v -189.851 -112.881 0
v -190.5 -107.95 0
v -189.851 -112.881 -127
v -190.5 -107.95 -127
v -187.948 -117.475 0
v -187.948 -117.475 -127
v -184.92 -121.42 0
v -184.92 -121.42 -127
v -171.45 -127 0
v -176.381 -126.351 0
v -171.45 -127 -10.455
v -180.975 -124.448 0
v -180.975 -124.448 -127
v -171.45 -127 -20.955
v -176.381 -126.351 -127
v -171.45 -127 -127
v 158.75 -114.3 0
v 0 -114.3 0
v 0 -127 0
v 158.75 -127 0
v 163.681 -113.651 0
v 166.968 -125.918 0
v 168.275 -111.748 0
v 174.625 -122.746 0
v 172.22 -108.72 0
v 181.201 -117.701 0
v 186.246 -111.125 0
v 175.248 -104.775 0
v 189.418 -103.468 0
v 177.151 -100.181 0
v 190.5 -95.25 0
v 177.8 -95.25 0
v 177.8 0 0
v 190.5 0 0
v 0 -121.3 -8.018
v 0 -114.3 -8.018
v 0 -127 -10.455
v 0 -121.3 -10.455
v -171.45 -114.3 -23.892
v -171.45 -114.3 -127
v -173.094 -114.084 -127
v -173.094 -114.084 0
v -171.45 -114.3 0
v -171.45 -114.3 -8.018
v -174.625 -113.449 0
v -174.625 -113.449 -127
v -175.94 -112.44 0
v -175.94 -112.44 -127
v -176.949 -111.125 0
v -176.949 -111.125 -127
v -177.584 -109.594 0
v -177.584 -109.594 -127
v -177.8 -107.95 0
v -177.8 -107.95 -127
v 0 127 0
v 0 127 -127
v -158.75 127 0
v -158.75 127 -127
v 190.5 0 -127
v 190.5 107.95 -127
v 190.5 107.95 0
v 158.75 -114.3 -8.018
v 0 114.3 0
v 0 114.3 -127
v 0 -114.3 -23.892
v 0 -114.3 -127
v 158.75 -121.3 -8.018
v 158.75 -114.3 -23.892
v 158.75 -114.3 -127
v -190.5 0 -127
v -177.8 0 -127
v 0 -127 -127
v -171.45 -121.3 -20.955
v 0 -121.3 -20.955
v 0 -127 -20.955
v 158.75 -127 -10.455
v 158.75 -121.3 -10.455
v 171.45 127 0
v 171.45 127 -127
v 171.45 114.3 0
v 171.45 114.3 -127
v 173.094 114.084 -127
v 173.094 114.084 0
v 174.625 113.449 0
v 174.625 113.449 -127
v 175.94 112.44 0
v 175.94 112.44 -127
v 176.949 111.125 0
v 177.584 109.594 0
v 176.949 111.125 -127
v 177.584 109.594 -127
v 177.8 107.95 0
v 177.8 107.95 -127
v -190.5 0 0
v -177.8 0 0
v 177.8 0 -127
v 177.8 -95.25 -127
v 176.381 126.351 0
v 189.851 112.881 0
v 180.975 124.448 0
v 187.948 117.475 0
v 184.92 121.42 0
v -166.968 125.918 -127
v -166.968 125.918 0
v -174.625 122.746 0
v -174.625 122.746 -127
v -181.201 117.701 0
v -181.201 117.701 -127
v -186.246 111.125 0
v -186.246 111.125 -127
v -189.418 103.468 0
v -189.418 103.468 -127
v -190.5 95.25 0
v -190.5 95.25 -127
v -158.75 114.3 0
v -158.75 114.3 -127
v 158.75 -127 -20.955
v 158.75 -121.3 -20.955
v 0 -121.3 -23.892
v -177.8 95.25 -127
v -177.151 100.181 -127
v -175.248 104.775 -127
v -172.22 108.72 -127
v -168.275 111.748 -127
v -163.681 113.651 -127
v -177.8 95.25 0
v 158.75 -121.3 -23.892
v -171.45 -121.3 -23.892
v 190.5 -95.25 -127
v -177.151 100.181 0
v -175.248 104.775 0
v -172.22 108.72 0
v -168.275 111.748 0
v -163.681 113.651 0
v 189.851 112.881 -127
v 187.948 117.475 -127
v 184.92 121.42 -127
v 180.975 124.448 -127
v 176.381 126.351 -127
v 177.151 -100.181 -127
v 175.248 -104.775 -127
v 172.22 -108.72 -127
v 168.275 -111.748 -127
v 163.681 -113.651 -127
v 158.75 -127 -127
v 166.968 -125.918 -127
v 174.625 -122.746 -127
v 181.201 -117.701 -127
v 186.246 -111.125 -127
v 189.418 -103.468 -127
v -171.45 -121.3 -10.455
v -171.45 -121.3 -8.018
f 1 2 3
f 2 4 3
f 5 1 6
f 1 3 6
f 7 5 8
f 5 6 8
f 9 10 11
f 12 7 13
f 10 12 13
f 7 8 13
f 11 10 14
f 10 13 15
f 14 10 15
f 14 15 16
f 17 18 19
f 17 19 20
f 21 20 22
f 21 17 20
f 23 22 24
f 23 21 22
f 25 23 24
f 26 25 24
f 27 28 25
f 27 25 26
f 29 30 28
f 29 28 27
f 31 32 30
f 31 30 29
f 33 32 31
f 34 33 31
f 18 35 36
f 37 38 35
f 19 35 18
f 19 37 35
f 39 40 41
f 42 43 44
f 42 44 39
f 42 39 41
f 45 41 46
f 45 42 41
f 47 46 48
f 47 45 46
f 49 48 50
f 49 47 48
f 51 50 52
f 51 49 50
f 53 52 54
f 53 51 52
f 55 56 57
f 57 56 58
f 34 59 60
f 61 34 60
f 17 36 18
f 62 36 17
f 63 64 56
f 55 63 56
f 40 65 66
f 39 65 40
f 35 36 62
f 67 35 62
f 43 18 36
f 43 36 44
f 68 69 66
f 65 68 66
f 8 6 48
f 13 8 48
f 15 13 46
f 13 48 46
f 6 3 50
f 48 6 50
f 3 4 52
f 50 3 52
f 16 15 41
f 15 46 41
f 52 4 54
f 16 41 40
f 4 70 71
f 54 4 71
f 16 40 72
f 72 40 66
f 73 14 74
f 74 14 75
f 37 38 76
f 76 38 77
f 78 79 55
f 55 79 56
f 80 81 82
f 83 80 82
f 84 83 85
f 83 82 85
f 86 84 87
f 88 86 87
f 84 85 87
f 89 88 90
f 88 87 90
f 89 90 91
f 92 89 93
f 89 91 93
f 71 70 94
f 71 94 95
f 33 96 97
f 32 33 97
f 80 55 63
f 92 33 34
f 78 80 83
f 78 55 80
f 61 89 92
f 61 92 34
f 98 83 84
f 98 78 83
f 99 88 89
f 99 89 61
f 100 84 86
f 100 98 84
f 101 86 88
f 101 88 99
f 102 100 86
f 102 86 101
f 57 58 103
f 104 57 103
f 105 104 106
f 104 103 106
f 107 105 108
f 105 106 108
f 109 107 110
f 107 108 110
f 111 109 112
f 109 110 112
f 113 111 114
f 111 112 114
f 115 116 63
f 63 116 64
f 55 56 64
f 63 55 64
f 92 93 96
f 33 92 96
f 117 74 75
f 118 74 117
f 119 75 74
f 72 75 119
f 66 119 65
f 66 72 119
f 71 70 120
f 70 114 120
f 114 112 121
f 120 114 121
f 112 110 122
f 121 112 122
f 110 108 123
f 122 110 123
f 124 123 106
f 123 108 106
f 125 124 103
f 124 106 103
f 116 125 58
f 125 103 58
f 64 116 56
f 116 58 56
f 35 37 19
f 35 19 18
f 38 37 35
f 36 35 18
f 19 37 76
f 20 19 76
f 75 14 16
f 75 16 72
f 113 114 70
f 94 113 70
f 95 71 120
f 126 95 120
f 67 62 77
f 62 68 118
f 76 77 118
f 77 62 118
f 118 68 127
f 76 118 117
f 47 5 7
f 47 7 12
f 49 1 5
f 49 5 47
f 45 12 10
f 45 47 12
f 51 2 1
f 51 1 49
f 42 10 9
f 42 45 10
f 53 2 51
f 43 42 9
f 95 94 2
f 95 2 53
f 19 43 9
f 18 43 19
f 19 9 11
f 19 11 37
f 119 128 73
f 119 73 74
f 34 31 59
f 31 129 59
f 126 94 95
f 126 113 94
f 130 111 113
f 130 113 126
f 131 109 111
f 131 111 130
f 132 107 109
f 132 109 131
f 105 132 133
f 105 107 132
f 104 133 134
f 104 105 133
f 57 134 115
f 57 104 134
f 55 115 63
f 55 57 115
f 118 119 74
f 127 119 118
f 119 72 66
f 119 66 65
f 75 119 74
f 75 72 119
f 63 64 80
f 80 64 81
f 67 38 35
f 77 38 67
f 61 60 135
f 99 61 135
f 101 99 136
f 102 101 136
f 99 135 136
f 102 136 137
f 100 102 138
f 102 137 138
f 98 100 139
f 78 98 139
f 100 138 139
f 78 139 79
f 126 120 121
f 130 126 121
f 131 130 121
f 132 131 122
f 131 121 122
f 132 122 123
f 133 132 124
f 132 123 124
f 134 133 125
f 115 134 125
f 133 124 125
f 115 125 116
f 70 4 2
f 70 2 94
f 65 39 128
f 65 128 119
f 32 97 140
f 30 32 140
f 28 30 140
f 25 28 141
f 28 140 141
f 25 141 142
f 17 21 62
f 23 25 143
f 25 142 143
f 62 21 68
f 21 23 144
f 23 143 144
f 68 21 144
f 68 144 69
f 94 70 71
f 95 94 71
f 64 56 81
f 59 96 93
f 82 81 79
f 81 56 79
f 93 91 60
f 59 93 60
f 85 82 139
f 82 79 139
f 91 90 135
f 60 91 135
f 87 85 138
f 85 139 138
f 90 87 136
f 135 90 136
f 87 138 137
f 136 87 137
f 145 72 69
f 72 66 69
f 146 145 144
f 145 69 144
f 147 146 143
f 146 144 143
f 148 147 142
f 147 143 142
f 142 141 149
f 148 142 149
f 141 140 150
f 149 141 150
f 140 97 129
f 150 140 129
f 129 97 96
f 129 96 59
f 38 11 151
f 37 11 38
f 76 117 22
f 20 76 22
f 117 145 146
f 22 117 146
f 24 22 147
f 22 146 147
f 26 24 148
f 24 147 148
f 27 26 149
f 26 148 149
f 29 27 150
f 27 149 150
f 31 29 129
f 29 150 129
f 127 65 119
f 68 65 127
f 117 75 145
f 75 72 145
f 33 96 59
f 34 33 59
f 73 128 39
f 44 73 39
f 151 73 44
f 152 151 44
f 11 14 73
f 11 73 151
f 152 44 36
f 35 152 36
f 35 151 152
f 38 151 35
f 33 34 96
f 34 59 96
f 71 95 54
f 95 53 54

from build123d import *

# Parameters (mm, degrees)
SKETCH1_W           = 381
SKETCH1_H           = 254
BOSS_EXTRUDE1_DEPTH = 127
FILLET5_R           = 19.05
FILLET4_R           = 31.75
CUT_EXTRUDE1_DEPTH  = 262.817207227
CUT_EXTRUDE2_REACH  = 343.958
SKETCH5_W           = 330.2
SKETCH5_H           = 10.5
SKETCH13_W          = 330.2
SKETCH13_H          = 15.875
CUT_EXTRUDE6_DEPTH  = 7
SPLIT1_START        = -107.95
SPLIT1_OUTLINE_W    = 368.3
SPLIT1_OUTLINE_H    = 127
SPLIT1_DEPTH        = 234.95
SPLIT1_START_2      = -127
SPLIT1_2_DEPTH      = 19.05
SPLIT1_3_OUTLINE_W  = 12.7
SPLIT1_3_OUTLINE_H  = 127
SPLIT1_3_DEPTH      = 127
SPLIT1_4_DEPTH      = 103.1075
SPLIT1_START_3      = -23.8925
SPLIT1_5_DEPTH      = 23.8925
SPLIT1_START_4      = -8.0175
SPLIT1_6_OUTLINE_W  = 158.75
SPLIT1_6_OUTLINE_H  = 12.7
SPLIT1_6_DEPTH      = 8.0175
SPLIT1_7_OUTLINE_W  = 158.75
SPLIT1_7_OUTLINE_H  = 5.7
SPLIT1_7_DEPTH      = 2.9375
SPLIT1_START_5      = -10.455
SPLIT1_8_OUTLINE_W  = 158.75
SPLIT1_8_OUTLINE_H  = 5.7
SPLIT1_8_DEPTH      = 2.4375
SPLIT1_9_DEPTH      = 127
SPLIT1_10_DEPTH     = 127


# Read off the part's stored shape, not the designer's step: Split1
with BuildPart() as part:
    # Sketch1 → Boss-Extrude1 (new body)
    with BuildSketch(Plane.XY):
        Rectangle(SKETCH1_W, SKETCH1_H)
    extrude(amount=-BOSS_EXTRUDE1_DEPTH)

    # Fillet5
    fillet5_edges = [part.edges().sort_by_distance(p)[0] for p in [
        (-190.5, -127, -63.5),
        (190.5, 127, -63.5),
    ]]
    fillet(fillet5_edges, radius=FILLET5_R)

    # Fillet4
    fillet4_edges = [part.edges().sort_by_distance(p)[0] for p in [
        (190.5, -127, -63.5),
        (-190.5, 127, -63.5),
    ]]
    fillet(fillet4_edges, radius=FILLET4_R)

    # Sketch3 → Cut-Extrude1 (cut, through all)
    with BuildSketch(Plane(origin=(0, 0, 0), x_dir=(-1, 0, 0), z_dir=(0, 0, -1))):
        with BuildLine():
            Line((-158.75, -114.3), (171.45, -114.3))
            ThreePointArc((171.45, -114.3), (175.940128061, -112.440128061), (177.8, -107.95))
            Line((177.8, -107.95), (177.8, 95.25))
            ThreePointArc((177.8, 95.25), (172.220384182, 108.720384182), (158.75, 114.3))
            Line((158.75, 114.3), (-171.45, 114.3))
            ThreePointArc((-171.45, 114.3), (-175.940128061, 112.440128061), (-177.8, 107.95))
            Line((-177.8, 107.95), (-177.8, -95.25))
            ThreePointArc((-177.8, -95.25), (-172.220384182, -108.720384182), (-158.75, -114.3))
        make_face()
    extrude(amount=CUT_EXTRUDE1_DEPTH, mode=Mode.SUBTRACT)

    # Sketch5 → Cut-Extrude2 (cut, up to next)
    with BuildSketch(Plane.XZ.offset(127), mode=Mode.PRIVATE) as cut_extrude2_sk1:
        with Locations((-6.35, -15.705)):
            Rectangle(SKETCH5_W, SKETCH5_H)
    cut_extrude2_tool1 = extrude(cut_extrude2_sk1.sketch, amount=-CUT_EXTRUDE2_REACH, mode=Mode.PRIVATE) & part.part
    add(cut_extrude2_tool1.solids().sort_by_distance((-6.35, -127, -15.705))[0], mode=Mode.SUBTRACT)

    # Sketch13 → Cut-Extrude6 (cut)
    with BuildSketch(Plane(origin=(0, -114.3, 0), x_dir=(1, 0, 0), z_dir=(0, 1, 0))):
        with Locations((-6.35, 15.955)):
            Rectangle(SKETCH13_W, SKETCH13_H)
    extrude(amount=-CUT_EXTRUDE6_DEPTH, mode=Mode.SUBTRACT)

    # Split1 outline → Split1 (cut)
    with BuildSketch(Plane(origin=(0, 0, 0), x_dir=(1, 0, 0), z_dir=(0, 1, 0)).offset(SPLIT1_START)):
        with Locations((6.35, 63.5)):
            Rectangle(SPLIT1_OUTLINE_W, SPLIT1_OUTLINE_H)
    extrude(amount=SPLIT1_DEPTH, mode=Mode.SUBTRACT)

    # Split1 2 outline → Split1 2 (cut)
    with BuildSketch(Plane(origin=(0, 0, 0), x_dir=(1, 0, 0), z_dir=(0, 1, 0)).offset(SPLIT1_START_2)):
        Polygon((0, 0), (190.5, 0), (190.5, 127), (0, 127), (0, 20.955), (158.75, 20.955), (158.75, 10.455), (0, 10.455), align=None)
    extrude(amount=SPLIT1_2_DEPTH, mode=Mode.SUBTRACT)

    # Split1 3 outline → Split1 3 (cut)
    with BuildSketch(Plane(origin=(0, 0, 0), x_dir=(1, 0, 0), z_dir=(0, 1, 0))):
        with Locations((-184.15, 63.5)):
            Rectangle(SPLIT1_3_OUTLINE_W, SPLIT1_3_OUTLINE_H)
    extrude(amount=SPLIT1_3_DEPTH, mode=Mode.SUBTRACT)


with BuildPart() as body_2:
    # Split1 4 outline → Split1 4 (new body)
    with BuildSketch(Plane.XY.offset(SPLIT1_START_2)):
        with BuildLine():
            Line((0, -127), (158.75, -127))
            ThreePointArc((158.75, -127), (181.200640303, -117.700640303), (190.5, -95.25))
            Line((190.5, -95.25), (190.5, 0))
            Line((190.5, 0), (177.8, 0))
            Line((177.8, 0), (177.8, -95.25))
            ThreePointArc((177.8, -95.25), (172.220384182, -108.720384182), (158.75, -114.3))
            Line((158.75, -114.3), (0, -114.3))
            Line((0, -114.3), (0, -127))
        make_face()
    extrude(amount=SPLIT1_4_DEPTH)

    # Split1 5 outline → Split1 5 (add)
    with BuildSketch(Plane.XY.offset(SPLIT1_START_3)):
        with BuildLine():
            Line((158.75, -114.3), (158.75, -127))
            ThreePointArc((158.75, -127), (181.200640303, -117.700640303), (190.5, -95.25))
            Line((190.5, -95.25), (190.5, 0))
            Line((190.5, 0), (177.8, 0))
            Line((177.8, 0), (177.8, -95.25))
            ThreePointArc((177.8, -95.25), (172.220384182, -108.720384182), (158.75, -114.3))
        make_face()
    extrude(amount=SPLIT1_5_DEPTH)

    # Split1 6 outline → Split1 6 (add)
    with BuildSketch(Plane.XY.offset(SPLIT1_START_4)):
        with Locations((79.375, -120.65)):
            Rectangle(SPLIT1_6_OUTLINE_W, SPLIT1_6_OUTLINE_H)
    extrude(amount=SPLIT1_6_DEPTH)

    # Split1 7 outline → Split1 7 (add)
    with BuildSketch(Plane.XY.offset(SPLIT1_START_3)):
        with Locations((79.375, -124.15)):
            Rectangle(SPLIT1_7_OUTLINE_W, SPLIT1_7_OUTLINE_H)
    extrude(amount=SPLIT1_7_DEPTH)

    # Split1 8 outline → Split1 8 (add)
    with BuildSketch(Plane.XY.offset(SPLIT1_START_5)):
        with Locations((79.375, -124.15)):
            Rectangle(SPLIT1_8_OUTLINE_W, SPLIT1_8_OUTLINE_H)
    extrude(amount=SPLIT1_8_DEPTH)


with BuildPart() as body_3:
    # Split1 9 outline → Split1 9 (new body)
    with BuildSketch(Plane.XY.offset(SPLIT1_START_2)):
        with BuildLine():
            Line((0, 127), (0, 114.3))
            Line((0, 114.3), (171.45, 114.3))
            ThreePointArc((171.45, 114.3), (175.940128061, 112.440128061), (177.8, 107.95))
            Line((177.8, 107.95), (177.8, 0))
            Line((177.8, 0), (190.5, 0))
            Line((190.5, 0), (190.5, 107.95))
            ThreePointArc((190.5, 107.95), (184.920384182, 121.420384182), (171.45, 127))
            Line((171.45, 127), (0, 127))
        make_face()
    extrude(amount=SPLIT1_9_DEPTH)


with BuildPart() as body_4:
    # Split1 10 outline → Split1 10 (new body)
    with BuildSketch(Plane.XY.offset(SPLIT1_START_2)):
        with BuildLine():
            Line((-190.5, 0), (-177.8, 0))
            Line((-177.8, 0), (-177.8, 95.25))
            ThreePointArc((-177.8, 95.25), (-172.220384182, 108.720384182), (-158.75, 114.3))
            Line((-158.75, 114.3), (0, 114.3))
            Line((0, 114.3), (0, 127))
            Line((0, 127), (-158.75, 127))
            ThreePointArc((-158.75, 127), (-181.200640303, 117.700640303), (-190.5, 95.25))
            Line((-190.5, 95.25), (-190.5, 0))
        make_face()
    extrude(amount=SPLIT1_10_DEPTH)


solid = Compound([part.part, body_2.part, body_3.part, body_4.part])
